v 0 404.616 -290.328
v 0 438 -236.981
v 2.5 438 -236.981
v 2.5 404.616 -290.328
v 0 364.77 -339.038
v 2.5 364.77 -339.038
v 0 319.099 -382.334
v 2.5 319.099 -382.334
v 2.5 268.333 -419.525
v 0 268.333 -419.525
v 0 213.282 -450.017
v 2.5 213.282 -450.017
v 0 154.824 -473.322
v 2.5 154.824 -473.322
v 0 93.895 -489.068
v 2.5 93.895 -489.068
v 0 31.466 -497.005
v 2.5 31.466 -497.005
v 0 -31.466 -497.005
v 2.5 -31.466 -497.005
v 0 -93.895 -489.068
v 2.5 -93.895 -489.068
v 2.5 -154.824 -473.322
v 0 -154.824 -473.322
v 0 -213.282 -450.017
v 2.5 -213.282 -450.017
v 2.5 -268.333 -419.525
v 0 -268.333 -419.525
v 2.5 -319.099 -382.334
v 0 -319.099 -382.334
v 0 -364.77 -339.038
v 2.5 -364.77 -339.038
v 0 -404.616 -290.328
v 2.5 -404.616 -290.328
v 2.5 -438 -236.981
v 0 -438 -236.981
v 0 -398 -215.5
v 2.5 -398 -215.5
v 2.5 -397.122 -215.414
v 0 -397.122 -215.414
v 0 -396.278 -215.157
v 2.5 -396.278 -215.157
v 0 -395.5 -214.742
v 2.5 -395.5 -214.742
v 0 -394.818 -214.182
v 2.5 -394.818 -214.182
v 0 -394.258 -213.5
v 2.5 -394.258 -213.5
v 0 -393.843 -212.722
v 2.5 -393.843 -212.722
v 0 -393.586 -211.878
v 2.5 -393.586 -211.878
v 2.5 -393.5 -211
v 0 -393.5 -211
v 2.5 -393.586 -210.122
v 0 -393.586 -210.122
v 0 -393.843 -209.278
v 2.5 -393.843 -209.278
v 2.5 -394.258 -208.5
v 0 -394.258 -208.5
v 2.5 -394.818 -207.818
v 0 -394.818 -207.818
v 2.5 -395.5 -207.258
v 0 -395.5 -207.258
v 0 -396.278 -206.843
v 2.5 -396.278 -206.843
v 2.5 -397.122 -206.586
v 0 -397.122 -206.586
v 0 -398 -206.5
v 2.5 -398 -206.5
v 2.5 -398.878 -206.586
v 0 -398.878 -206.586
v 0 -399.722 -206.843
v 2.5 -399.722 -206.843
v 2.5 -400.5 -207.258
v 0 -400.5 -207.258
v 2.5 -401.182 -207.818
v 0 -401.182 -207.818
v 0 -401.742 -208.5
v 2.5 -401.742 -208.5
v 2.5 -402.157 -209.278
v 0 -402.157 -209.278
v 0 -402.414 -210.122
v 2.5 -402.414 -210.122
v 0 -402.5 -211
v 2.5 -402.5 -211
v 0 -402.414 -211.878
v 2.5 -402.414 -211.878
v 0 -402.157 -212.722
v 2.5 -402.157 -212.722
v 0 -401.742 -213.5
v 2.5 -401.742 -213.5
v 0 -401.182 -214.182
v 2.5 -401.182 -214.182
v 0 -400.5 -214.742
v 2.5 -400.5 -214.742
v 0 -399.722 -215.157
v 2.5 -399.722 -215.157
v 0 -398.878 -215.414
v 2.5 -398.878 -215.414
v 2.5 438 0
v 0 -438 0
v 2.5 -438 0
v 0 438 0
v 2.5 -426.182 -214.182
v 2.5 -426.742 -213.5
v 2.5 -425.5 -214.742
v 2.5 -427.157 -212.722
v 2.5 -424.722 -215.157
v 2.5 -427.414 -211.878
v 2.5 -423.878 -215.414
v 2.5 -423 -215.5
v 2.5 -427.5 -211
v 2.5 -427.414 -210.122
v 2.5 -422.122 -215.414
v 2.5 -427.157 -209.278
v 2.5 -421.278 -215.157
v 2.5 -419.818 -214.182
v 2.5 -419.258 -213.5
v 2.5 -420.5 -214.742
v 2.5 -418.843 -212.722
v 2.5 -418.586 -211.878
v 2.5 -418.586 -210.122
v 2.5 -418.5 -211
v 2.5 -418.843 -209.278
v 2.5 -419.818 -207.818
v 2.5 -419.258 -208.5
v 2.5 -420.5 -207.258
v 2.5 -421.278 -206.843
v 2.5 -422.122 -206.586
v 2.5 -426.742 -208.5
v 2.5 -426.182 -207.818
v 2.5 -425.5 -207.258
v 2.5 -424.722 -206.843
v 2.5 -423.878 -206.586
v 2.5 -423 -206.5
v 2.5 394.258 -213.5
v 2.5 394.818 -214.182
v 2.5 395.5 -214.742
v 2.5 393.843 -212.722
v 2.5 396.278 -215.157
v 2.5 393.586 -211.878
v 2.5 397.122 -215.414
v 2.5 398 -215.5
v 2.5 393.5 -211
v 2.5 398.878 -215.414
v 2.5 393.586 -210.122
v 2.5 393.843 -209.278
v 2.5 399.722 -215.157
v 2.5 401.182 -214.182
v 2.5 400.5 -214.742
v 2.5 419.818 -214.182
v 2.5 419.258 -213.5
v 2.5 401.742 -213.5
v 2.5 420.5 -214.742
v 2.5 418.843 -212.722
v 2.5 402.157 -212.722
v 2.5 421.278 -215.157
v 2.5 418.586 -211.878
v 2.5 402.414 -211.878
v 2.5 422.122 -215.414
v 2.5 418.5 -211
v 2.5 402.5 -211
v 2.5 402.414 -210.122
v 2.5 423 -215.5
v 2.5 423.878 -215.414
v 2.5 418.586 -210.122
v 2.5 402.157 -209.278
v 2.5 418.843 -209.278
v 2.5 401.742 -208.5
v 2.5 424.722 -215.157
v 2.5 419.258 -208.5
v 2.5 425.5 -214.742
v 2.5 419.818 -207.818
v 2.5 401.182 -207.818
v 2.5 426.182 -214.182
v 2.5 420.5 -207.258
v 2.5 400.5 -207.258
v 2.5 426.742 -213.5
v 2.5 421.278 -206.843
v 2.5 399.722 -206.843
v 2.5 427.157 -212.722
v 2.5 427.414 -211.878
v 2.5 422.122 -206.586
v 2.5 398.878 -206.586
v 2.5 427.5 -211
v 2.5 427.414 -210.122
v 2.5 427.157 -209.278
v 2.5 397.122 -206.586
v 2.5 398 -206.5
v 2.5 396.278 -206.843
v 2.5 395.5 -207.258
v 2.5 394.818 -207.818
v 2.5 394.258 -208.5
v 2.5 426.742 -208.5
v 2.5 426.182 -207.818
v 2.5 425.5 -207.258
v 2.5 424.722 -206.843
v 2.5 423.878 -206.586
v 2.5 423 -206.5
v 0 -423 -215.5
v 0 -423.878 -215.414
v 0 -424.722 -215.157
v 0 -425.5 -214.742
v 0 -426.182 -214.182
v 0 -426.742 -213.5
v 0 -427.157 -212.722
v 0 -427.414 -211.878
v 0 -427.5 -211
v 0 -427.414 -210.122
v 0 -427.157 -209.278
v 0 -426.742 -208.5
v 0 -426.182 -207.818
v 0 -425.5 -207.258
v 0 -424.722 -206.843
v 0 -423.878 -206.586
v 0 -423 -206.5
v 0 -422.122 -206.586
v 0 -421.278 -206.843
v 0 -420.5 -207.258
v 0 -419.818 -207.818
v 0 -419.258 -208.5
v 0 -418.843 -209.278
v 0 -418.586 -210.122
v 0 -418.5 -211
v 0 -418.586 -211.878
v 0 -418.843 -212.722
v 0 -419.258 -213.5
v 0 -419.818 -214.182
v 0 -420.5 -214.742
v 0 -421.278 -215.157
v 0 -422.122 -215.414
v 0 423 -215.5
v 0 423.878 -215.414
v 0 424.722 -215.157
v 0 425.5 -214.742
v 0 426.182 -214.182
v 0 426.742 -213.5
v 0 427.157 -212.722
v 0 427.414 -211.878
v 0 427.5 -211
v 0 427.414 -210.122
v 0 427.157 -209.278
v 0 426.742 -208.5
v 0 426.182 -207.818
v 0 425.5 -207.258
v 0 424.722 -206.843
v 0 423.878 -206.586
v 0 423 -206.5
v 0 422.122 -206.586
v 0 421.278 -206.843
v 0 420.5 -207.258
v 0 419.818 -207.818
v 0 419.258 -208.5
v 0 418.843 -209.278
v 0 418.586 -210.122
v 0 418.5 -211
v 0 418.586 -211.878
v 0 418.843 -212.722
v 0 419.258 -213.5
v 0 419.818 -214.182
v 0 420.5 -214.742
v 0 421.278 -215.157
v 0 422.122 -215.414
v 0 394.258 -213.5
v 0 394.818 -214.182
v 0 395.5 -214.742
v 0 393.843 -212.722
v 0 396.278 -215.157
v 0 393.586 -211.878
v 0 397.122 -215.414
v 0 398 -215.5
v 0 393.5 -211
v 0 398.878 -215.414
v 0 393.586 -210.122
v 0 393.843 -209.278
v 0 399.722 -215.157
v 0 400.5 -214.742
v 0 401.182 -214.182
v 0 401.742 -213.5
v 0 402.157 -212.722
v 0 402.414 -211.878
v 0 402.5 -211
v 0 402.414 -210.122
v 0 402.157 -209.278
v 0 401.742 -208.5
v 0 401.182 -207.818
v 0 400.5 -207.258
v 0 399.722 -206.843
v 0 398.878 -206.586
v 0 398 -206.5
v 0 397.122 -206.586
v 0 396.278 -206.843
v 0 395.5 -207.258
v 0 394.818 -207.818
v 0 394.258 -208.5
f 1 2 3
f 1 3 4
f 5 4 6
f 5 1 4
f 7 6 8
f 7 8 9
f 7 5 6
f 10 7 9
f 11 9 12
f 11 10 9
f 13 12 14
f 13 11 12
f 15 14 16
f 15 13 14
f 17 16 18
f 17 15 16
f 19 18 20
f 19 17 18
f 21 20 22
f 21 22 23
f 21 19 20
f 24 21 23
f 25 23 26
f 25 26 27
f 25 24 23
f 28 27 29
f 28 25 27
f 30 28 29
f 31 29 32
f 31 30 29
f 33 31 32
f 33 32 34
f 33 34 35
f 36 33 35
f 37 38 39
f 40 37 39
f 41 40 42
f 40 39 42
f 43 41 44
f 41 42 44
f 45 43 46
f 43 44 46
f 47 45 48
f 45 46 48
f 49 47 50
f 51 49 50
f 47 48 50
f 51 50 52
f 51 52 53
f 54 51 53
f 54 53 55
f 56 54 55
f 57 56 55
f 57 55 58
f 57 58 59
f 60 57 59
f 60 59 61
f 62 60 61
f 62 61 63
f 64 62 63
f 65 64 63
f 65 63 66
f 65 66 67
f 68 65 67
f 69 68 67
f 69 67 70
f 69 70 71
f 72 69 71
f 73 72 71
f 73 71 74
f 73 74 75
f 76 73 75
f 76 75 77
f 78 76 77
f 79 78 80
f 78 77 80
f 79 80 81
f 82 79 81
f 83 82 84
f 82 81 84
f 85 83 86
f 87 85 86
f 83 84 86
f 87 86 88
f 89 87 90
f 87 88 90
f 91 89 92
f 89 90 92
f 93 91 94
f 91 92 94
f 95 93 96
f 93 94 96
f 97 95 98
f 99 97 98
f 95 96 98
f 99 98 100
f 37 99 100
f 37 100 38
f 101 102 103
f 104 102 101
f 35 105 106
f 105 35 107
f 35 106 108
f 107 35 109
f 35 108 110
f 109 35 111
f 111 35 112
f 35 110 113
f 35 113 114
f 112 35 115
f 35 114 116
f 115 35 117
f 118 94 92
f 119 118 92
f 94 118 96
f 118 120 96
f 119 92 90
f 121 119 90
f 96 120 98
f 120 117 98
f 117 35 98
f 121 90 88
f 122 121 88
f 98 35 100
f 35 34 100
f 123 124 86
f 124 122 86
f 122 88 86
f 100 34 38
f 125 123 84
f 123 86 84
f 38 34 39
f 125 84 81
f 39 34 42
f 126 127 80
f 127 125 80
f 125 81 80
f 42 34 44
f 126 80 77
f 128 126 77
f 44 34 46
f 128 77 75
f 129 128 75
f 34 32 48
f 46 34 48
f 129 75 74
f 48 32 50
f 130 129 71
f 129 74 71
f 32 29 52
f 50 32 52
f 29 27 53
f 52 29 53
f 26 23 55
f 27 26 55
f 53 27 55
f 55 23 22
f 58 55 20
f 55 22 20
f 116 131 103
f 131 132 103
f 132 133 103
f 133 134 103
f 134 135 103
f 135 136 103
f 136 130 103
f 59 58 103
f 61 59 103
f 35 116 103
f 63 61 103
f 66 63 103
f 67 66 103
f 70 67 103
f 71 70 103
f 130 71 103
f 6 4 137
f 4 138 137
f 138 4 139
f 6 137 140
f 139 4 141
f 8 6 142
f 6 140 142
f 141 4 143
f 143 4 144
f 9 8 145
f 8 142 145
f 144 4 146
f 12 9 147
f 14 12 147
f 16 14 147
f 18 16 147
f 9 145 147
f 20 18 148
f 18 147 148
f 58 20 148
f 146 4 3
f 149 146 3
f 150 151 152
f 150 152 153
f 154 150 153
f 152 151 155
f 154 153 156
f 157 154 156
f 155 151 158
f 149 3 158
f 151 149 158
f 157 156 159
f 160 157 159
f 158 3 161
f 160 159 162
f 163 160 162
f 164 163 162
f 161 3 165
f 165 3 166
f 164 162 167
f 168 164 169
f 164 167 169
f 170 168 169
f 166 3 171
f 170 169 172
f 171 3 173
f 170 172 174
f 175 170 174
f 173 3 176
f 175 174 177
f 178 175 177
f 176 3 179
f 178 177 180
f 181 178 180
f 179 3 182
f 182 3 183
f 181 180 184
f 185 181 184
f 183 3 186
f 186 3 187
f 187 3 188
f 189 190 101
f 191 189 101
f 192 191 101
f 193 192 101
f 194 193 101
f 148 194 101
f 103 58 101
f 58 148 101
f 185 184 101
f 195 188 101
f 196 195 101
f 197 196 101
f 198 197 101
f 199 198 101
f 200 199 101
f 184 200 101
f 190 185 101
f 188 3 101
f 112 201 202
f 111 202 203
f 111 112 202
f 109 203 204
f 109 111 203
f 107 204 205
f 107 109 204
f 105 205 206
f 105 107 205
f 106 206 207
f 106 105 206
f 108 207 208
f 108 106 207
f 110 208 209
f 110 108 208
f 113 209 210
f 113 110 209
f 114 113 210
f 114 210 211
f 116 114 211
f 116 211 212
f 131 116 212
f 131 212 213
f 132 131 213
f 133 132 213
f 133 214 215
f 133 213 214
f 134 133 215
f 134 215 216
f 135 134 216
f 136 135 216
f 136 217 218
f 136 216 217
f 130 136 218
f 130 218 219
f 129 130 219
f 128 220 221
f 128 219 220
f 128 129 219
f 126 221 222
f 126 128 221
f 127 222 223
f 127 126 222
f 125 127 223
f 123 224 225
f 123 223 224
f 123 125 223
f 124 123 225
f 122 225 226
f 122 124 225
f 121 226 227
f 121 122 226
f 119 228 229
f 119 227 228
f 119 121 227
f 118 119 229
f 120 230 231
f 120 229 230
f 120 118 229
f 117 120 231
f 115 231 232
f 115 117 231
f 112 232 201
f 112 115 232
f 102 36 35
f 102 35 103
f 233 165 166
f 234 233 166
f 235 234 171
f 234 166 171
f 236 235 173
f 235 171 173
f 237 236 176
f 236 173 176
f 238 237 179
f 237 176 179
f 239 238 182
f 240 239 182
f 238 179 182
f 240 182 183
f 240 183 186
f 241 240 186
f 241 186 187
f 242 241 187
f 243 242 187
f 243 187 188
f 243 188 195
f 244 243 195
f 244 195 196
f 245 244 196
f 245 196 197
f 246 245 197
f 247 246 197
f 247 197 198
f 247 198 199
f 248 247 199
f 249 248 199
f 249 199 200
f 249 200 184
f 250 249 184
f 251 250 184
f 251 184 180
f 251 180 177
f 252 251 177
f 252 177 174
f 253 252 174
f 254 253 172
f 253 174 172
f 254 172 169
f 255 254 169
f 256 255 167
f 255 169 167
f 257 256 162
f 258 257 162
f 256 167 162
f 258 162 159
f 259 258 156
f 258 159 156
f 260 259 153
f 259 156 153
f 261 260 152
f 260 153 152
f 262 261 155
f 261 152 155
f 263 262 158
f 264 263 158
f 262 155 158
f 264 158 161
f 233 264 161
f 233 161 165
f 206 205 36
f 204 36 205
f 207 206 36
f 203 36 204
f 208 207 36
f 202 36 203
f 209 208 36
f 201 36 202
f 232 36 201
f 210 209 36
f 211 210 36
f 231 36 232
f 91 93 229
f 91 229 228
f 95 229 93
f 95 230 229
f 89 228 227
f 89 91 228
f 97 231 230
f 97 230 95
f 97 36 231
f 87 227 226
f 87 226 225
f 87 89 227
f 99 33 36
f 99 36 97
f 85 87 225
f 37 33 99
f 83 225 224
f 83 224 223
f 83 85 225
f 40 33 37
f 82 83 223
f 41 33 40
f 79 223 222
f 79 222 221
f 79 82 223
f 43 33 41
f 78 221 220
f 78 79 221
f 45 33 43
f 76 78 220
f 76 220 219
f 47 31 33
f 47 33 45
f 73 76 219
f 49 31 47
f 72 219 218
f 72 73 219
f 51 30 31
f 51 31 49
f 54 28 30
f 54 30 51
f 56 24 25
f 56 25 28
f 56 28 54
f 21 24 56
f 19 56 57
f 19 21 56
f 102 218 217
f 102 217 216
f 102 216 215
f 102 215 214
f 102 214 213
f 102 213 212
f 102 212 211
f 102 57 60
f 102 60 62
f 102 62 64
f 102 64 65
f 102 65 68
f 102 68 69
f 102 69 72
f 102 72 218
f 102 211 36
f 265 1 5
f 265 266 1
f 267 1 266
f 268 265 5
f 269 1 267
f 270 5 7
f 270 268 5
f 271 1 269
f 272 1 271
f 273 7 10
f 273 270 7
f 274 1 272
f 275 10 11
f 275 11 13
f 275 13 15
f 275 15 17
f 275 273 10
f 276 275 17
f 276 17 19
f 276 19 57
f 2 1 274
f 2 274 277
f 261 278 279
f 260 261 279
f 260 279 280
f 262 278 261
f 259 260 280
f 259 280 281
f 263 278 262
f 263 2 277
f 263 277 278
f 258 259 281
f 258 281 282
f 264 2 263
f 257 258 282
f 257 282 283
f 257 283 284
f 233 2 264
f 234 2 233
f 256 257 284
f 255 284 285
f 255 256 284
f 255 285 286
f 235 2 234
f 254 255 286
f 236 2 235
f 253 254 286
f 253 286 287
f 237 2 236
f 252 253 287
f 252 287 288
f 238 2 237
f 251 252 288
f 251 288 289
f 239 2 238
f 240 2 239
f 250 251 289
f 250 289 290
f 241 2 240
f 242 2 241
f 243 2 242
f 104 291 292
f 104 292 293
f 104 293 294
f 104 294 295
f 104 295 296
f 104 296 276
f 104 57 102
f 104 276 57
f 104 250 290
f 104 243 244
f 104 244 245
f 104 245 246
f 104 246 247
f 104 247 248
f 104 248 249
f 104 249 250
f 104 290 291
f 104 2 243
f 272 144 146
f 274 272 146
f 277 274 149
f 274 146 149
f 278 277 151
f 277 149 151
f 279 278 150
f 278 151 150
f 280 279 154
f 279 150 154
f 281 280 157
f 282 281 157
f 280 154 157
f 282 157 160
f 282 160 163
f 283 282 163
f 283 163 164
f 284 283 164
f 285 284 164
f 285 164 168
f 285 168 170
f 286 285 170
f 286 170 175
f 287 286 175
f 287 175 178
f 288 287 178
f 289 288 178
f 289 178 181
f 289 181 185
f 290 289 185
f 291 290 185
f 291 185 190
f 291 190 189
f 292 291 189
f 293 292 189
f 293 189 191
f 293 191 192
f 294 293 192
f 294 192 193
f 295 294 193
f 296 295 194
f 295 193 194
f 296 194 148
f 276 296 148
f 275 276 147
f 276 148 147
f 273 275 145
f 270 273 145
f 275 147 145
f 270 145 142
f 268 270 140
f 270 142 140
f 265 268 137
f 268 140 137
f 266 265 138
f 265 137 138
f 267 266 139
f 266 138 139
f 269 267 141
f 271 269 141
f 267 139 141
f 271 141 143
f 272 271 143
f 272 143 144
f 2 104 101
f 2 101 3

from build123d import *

# Parameters (mm, degrees)
BOSS_EXTRUDE1_DEPTH     = 2.5
SKETCH2_R               = 4.5
CUT_EXTRUDE1_DEPTH      = 10
LPATTERN1_COUNT         = 2
LPATTERN1_PITCH         = 25
MIRROR1_COPY_1_SKETCH_R = 4.5
MIRROR1_COPY_1_DEPTH    = 10


with BuildPart() as part:
    # Sketch1 → Boss-Extrude1 (new body)
    with BuildSketch(Plane(origin=(0, 0, 0), x_dir=(0, 0, -1), z_dir=(1, 0, 0))):
        with BuildLine():
            Line((0, 438), (236.981011898, 438))
            ThreePointArc((236.981011898, 438), (498, 0), (236.981011898, -438))
            Line((236.981011898, -438), (0, -438))
            Line((0, -438), (0, 438))
        make_face()
    extrude(amount=BOSS_EXTRUDE1_DEPTH)

    # Sketch2 → Cut-Extrude1 (cut)
    with BuildSketch(Plane(origin=(2.5, 0, 0), x_dir=(0, 0, -1), z_dir=(1, 0, 0))):
        with Locations((211, 423)):
            Circle(SKETCH2_R)
    cut_extrude1 = extrude(amount=-CUT_EXTRUDE1_DEPTH, mode=Mode.SUBTRACT)

    # LPattern1: Cut-Extrude1 ×2
    with Locations(*[(0, -i * LPATTERN1_PITCH, 0) for i in range(1, LPATTERN1_COUNT)]):
        add(cut_extrude1, mode=Mode.SUBTRACT)

    # Mirror1: Cut-Extrude1 across plane
    add(cut_extrude1.mirror(Plane.ZX), mode=Mode.SUBTRACT)

    # Mirror1 copy 1 sketch → Mirror1 copy 1 (cut)
    with BuildSketch(Plane(origin=(2.5, 25, 0), x_dir=(0, 0, -1), z_dir=(1, 0, 0))):
        with Locations((211, -423)):
            Circle(MIRROR1_COPY_1_SKETCH_R)
    extrude(amount=-MIRROR1_COPY_1_DEPTH, mode=Mode.SUBTRACT)


solid = part.part
